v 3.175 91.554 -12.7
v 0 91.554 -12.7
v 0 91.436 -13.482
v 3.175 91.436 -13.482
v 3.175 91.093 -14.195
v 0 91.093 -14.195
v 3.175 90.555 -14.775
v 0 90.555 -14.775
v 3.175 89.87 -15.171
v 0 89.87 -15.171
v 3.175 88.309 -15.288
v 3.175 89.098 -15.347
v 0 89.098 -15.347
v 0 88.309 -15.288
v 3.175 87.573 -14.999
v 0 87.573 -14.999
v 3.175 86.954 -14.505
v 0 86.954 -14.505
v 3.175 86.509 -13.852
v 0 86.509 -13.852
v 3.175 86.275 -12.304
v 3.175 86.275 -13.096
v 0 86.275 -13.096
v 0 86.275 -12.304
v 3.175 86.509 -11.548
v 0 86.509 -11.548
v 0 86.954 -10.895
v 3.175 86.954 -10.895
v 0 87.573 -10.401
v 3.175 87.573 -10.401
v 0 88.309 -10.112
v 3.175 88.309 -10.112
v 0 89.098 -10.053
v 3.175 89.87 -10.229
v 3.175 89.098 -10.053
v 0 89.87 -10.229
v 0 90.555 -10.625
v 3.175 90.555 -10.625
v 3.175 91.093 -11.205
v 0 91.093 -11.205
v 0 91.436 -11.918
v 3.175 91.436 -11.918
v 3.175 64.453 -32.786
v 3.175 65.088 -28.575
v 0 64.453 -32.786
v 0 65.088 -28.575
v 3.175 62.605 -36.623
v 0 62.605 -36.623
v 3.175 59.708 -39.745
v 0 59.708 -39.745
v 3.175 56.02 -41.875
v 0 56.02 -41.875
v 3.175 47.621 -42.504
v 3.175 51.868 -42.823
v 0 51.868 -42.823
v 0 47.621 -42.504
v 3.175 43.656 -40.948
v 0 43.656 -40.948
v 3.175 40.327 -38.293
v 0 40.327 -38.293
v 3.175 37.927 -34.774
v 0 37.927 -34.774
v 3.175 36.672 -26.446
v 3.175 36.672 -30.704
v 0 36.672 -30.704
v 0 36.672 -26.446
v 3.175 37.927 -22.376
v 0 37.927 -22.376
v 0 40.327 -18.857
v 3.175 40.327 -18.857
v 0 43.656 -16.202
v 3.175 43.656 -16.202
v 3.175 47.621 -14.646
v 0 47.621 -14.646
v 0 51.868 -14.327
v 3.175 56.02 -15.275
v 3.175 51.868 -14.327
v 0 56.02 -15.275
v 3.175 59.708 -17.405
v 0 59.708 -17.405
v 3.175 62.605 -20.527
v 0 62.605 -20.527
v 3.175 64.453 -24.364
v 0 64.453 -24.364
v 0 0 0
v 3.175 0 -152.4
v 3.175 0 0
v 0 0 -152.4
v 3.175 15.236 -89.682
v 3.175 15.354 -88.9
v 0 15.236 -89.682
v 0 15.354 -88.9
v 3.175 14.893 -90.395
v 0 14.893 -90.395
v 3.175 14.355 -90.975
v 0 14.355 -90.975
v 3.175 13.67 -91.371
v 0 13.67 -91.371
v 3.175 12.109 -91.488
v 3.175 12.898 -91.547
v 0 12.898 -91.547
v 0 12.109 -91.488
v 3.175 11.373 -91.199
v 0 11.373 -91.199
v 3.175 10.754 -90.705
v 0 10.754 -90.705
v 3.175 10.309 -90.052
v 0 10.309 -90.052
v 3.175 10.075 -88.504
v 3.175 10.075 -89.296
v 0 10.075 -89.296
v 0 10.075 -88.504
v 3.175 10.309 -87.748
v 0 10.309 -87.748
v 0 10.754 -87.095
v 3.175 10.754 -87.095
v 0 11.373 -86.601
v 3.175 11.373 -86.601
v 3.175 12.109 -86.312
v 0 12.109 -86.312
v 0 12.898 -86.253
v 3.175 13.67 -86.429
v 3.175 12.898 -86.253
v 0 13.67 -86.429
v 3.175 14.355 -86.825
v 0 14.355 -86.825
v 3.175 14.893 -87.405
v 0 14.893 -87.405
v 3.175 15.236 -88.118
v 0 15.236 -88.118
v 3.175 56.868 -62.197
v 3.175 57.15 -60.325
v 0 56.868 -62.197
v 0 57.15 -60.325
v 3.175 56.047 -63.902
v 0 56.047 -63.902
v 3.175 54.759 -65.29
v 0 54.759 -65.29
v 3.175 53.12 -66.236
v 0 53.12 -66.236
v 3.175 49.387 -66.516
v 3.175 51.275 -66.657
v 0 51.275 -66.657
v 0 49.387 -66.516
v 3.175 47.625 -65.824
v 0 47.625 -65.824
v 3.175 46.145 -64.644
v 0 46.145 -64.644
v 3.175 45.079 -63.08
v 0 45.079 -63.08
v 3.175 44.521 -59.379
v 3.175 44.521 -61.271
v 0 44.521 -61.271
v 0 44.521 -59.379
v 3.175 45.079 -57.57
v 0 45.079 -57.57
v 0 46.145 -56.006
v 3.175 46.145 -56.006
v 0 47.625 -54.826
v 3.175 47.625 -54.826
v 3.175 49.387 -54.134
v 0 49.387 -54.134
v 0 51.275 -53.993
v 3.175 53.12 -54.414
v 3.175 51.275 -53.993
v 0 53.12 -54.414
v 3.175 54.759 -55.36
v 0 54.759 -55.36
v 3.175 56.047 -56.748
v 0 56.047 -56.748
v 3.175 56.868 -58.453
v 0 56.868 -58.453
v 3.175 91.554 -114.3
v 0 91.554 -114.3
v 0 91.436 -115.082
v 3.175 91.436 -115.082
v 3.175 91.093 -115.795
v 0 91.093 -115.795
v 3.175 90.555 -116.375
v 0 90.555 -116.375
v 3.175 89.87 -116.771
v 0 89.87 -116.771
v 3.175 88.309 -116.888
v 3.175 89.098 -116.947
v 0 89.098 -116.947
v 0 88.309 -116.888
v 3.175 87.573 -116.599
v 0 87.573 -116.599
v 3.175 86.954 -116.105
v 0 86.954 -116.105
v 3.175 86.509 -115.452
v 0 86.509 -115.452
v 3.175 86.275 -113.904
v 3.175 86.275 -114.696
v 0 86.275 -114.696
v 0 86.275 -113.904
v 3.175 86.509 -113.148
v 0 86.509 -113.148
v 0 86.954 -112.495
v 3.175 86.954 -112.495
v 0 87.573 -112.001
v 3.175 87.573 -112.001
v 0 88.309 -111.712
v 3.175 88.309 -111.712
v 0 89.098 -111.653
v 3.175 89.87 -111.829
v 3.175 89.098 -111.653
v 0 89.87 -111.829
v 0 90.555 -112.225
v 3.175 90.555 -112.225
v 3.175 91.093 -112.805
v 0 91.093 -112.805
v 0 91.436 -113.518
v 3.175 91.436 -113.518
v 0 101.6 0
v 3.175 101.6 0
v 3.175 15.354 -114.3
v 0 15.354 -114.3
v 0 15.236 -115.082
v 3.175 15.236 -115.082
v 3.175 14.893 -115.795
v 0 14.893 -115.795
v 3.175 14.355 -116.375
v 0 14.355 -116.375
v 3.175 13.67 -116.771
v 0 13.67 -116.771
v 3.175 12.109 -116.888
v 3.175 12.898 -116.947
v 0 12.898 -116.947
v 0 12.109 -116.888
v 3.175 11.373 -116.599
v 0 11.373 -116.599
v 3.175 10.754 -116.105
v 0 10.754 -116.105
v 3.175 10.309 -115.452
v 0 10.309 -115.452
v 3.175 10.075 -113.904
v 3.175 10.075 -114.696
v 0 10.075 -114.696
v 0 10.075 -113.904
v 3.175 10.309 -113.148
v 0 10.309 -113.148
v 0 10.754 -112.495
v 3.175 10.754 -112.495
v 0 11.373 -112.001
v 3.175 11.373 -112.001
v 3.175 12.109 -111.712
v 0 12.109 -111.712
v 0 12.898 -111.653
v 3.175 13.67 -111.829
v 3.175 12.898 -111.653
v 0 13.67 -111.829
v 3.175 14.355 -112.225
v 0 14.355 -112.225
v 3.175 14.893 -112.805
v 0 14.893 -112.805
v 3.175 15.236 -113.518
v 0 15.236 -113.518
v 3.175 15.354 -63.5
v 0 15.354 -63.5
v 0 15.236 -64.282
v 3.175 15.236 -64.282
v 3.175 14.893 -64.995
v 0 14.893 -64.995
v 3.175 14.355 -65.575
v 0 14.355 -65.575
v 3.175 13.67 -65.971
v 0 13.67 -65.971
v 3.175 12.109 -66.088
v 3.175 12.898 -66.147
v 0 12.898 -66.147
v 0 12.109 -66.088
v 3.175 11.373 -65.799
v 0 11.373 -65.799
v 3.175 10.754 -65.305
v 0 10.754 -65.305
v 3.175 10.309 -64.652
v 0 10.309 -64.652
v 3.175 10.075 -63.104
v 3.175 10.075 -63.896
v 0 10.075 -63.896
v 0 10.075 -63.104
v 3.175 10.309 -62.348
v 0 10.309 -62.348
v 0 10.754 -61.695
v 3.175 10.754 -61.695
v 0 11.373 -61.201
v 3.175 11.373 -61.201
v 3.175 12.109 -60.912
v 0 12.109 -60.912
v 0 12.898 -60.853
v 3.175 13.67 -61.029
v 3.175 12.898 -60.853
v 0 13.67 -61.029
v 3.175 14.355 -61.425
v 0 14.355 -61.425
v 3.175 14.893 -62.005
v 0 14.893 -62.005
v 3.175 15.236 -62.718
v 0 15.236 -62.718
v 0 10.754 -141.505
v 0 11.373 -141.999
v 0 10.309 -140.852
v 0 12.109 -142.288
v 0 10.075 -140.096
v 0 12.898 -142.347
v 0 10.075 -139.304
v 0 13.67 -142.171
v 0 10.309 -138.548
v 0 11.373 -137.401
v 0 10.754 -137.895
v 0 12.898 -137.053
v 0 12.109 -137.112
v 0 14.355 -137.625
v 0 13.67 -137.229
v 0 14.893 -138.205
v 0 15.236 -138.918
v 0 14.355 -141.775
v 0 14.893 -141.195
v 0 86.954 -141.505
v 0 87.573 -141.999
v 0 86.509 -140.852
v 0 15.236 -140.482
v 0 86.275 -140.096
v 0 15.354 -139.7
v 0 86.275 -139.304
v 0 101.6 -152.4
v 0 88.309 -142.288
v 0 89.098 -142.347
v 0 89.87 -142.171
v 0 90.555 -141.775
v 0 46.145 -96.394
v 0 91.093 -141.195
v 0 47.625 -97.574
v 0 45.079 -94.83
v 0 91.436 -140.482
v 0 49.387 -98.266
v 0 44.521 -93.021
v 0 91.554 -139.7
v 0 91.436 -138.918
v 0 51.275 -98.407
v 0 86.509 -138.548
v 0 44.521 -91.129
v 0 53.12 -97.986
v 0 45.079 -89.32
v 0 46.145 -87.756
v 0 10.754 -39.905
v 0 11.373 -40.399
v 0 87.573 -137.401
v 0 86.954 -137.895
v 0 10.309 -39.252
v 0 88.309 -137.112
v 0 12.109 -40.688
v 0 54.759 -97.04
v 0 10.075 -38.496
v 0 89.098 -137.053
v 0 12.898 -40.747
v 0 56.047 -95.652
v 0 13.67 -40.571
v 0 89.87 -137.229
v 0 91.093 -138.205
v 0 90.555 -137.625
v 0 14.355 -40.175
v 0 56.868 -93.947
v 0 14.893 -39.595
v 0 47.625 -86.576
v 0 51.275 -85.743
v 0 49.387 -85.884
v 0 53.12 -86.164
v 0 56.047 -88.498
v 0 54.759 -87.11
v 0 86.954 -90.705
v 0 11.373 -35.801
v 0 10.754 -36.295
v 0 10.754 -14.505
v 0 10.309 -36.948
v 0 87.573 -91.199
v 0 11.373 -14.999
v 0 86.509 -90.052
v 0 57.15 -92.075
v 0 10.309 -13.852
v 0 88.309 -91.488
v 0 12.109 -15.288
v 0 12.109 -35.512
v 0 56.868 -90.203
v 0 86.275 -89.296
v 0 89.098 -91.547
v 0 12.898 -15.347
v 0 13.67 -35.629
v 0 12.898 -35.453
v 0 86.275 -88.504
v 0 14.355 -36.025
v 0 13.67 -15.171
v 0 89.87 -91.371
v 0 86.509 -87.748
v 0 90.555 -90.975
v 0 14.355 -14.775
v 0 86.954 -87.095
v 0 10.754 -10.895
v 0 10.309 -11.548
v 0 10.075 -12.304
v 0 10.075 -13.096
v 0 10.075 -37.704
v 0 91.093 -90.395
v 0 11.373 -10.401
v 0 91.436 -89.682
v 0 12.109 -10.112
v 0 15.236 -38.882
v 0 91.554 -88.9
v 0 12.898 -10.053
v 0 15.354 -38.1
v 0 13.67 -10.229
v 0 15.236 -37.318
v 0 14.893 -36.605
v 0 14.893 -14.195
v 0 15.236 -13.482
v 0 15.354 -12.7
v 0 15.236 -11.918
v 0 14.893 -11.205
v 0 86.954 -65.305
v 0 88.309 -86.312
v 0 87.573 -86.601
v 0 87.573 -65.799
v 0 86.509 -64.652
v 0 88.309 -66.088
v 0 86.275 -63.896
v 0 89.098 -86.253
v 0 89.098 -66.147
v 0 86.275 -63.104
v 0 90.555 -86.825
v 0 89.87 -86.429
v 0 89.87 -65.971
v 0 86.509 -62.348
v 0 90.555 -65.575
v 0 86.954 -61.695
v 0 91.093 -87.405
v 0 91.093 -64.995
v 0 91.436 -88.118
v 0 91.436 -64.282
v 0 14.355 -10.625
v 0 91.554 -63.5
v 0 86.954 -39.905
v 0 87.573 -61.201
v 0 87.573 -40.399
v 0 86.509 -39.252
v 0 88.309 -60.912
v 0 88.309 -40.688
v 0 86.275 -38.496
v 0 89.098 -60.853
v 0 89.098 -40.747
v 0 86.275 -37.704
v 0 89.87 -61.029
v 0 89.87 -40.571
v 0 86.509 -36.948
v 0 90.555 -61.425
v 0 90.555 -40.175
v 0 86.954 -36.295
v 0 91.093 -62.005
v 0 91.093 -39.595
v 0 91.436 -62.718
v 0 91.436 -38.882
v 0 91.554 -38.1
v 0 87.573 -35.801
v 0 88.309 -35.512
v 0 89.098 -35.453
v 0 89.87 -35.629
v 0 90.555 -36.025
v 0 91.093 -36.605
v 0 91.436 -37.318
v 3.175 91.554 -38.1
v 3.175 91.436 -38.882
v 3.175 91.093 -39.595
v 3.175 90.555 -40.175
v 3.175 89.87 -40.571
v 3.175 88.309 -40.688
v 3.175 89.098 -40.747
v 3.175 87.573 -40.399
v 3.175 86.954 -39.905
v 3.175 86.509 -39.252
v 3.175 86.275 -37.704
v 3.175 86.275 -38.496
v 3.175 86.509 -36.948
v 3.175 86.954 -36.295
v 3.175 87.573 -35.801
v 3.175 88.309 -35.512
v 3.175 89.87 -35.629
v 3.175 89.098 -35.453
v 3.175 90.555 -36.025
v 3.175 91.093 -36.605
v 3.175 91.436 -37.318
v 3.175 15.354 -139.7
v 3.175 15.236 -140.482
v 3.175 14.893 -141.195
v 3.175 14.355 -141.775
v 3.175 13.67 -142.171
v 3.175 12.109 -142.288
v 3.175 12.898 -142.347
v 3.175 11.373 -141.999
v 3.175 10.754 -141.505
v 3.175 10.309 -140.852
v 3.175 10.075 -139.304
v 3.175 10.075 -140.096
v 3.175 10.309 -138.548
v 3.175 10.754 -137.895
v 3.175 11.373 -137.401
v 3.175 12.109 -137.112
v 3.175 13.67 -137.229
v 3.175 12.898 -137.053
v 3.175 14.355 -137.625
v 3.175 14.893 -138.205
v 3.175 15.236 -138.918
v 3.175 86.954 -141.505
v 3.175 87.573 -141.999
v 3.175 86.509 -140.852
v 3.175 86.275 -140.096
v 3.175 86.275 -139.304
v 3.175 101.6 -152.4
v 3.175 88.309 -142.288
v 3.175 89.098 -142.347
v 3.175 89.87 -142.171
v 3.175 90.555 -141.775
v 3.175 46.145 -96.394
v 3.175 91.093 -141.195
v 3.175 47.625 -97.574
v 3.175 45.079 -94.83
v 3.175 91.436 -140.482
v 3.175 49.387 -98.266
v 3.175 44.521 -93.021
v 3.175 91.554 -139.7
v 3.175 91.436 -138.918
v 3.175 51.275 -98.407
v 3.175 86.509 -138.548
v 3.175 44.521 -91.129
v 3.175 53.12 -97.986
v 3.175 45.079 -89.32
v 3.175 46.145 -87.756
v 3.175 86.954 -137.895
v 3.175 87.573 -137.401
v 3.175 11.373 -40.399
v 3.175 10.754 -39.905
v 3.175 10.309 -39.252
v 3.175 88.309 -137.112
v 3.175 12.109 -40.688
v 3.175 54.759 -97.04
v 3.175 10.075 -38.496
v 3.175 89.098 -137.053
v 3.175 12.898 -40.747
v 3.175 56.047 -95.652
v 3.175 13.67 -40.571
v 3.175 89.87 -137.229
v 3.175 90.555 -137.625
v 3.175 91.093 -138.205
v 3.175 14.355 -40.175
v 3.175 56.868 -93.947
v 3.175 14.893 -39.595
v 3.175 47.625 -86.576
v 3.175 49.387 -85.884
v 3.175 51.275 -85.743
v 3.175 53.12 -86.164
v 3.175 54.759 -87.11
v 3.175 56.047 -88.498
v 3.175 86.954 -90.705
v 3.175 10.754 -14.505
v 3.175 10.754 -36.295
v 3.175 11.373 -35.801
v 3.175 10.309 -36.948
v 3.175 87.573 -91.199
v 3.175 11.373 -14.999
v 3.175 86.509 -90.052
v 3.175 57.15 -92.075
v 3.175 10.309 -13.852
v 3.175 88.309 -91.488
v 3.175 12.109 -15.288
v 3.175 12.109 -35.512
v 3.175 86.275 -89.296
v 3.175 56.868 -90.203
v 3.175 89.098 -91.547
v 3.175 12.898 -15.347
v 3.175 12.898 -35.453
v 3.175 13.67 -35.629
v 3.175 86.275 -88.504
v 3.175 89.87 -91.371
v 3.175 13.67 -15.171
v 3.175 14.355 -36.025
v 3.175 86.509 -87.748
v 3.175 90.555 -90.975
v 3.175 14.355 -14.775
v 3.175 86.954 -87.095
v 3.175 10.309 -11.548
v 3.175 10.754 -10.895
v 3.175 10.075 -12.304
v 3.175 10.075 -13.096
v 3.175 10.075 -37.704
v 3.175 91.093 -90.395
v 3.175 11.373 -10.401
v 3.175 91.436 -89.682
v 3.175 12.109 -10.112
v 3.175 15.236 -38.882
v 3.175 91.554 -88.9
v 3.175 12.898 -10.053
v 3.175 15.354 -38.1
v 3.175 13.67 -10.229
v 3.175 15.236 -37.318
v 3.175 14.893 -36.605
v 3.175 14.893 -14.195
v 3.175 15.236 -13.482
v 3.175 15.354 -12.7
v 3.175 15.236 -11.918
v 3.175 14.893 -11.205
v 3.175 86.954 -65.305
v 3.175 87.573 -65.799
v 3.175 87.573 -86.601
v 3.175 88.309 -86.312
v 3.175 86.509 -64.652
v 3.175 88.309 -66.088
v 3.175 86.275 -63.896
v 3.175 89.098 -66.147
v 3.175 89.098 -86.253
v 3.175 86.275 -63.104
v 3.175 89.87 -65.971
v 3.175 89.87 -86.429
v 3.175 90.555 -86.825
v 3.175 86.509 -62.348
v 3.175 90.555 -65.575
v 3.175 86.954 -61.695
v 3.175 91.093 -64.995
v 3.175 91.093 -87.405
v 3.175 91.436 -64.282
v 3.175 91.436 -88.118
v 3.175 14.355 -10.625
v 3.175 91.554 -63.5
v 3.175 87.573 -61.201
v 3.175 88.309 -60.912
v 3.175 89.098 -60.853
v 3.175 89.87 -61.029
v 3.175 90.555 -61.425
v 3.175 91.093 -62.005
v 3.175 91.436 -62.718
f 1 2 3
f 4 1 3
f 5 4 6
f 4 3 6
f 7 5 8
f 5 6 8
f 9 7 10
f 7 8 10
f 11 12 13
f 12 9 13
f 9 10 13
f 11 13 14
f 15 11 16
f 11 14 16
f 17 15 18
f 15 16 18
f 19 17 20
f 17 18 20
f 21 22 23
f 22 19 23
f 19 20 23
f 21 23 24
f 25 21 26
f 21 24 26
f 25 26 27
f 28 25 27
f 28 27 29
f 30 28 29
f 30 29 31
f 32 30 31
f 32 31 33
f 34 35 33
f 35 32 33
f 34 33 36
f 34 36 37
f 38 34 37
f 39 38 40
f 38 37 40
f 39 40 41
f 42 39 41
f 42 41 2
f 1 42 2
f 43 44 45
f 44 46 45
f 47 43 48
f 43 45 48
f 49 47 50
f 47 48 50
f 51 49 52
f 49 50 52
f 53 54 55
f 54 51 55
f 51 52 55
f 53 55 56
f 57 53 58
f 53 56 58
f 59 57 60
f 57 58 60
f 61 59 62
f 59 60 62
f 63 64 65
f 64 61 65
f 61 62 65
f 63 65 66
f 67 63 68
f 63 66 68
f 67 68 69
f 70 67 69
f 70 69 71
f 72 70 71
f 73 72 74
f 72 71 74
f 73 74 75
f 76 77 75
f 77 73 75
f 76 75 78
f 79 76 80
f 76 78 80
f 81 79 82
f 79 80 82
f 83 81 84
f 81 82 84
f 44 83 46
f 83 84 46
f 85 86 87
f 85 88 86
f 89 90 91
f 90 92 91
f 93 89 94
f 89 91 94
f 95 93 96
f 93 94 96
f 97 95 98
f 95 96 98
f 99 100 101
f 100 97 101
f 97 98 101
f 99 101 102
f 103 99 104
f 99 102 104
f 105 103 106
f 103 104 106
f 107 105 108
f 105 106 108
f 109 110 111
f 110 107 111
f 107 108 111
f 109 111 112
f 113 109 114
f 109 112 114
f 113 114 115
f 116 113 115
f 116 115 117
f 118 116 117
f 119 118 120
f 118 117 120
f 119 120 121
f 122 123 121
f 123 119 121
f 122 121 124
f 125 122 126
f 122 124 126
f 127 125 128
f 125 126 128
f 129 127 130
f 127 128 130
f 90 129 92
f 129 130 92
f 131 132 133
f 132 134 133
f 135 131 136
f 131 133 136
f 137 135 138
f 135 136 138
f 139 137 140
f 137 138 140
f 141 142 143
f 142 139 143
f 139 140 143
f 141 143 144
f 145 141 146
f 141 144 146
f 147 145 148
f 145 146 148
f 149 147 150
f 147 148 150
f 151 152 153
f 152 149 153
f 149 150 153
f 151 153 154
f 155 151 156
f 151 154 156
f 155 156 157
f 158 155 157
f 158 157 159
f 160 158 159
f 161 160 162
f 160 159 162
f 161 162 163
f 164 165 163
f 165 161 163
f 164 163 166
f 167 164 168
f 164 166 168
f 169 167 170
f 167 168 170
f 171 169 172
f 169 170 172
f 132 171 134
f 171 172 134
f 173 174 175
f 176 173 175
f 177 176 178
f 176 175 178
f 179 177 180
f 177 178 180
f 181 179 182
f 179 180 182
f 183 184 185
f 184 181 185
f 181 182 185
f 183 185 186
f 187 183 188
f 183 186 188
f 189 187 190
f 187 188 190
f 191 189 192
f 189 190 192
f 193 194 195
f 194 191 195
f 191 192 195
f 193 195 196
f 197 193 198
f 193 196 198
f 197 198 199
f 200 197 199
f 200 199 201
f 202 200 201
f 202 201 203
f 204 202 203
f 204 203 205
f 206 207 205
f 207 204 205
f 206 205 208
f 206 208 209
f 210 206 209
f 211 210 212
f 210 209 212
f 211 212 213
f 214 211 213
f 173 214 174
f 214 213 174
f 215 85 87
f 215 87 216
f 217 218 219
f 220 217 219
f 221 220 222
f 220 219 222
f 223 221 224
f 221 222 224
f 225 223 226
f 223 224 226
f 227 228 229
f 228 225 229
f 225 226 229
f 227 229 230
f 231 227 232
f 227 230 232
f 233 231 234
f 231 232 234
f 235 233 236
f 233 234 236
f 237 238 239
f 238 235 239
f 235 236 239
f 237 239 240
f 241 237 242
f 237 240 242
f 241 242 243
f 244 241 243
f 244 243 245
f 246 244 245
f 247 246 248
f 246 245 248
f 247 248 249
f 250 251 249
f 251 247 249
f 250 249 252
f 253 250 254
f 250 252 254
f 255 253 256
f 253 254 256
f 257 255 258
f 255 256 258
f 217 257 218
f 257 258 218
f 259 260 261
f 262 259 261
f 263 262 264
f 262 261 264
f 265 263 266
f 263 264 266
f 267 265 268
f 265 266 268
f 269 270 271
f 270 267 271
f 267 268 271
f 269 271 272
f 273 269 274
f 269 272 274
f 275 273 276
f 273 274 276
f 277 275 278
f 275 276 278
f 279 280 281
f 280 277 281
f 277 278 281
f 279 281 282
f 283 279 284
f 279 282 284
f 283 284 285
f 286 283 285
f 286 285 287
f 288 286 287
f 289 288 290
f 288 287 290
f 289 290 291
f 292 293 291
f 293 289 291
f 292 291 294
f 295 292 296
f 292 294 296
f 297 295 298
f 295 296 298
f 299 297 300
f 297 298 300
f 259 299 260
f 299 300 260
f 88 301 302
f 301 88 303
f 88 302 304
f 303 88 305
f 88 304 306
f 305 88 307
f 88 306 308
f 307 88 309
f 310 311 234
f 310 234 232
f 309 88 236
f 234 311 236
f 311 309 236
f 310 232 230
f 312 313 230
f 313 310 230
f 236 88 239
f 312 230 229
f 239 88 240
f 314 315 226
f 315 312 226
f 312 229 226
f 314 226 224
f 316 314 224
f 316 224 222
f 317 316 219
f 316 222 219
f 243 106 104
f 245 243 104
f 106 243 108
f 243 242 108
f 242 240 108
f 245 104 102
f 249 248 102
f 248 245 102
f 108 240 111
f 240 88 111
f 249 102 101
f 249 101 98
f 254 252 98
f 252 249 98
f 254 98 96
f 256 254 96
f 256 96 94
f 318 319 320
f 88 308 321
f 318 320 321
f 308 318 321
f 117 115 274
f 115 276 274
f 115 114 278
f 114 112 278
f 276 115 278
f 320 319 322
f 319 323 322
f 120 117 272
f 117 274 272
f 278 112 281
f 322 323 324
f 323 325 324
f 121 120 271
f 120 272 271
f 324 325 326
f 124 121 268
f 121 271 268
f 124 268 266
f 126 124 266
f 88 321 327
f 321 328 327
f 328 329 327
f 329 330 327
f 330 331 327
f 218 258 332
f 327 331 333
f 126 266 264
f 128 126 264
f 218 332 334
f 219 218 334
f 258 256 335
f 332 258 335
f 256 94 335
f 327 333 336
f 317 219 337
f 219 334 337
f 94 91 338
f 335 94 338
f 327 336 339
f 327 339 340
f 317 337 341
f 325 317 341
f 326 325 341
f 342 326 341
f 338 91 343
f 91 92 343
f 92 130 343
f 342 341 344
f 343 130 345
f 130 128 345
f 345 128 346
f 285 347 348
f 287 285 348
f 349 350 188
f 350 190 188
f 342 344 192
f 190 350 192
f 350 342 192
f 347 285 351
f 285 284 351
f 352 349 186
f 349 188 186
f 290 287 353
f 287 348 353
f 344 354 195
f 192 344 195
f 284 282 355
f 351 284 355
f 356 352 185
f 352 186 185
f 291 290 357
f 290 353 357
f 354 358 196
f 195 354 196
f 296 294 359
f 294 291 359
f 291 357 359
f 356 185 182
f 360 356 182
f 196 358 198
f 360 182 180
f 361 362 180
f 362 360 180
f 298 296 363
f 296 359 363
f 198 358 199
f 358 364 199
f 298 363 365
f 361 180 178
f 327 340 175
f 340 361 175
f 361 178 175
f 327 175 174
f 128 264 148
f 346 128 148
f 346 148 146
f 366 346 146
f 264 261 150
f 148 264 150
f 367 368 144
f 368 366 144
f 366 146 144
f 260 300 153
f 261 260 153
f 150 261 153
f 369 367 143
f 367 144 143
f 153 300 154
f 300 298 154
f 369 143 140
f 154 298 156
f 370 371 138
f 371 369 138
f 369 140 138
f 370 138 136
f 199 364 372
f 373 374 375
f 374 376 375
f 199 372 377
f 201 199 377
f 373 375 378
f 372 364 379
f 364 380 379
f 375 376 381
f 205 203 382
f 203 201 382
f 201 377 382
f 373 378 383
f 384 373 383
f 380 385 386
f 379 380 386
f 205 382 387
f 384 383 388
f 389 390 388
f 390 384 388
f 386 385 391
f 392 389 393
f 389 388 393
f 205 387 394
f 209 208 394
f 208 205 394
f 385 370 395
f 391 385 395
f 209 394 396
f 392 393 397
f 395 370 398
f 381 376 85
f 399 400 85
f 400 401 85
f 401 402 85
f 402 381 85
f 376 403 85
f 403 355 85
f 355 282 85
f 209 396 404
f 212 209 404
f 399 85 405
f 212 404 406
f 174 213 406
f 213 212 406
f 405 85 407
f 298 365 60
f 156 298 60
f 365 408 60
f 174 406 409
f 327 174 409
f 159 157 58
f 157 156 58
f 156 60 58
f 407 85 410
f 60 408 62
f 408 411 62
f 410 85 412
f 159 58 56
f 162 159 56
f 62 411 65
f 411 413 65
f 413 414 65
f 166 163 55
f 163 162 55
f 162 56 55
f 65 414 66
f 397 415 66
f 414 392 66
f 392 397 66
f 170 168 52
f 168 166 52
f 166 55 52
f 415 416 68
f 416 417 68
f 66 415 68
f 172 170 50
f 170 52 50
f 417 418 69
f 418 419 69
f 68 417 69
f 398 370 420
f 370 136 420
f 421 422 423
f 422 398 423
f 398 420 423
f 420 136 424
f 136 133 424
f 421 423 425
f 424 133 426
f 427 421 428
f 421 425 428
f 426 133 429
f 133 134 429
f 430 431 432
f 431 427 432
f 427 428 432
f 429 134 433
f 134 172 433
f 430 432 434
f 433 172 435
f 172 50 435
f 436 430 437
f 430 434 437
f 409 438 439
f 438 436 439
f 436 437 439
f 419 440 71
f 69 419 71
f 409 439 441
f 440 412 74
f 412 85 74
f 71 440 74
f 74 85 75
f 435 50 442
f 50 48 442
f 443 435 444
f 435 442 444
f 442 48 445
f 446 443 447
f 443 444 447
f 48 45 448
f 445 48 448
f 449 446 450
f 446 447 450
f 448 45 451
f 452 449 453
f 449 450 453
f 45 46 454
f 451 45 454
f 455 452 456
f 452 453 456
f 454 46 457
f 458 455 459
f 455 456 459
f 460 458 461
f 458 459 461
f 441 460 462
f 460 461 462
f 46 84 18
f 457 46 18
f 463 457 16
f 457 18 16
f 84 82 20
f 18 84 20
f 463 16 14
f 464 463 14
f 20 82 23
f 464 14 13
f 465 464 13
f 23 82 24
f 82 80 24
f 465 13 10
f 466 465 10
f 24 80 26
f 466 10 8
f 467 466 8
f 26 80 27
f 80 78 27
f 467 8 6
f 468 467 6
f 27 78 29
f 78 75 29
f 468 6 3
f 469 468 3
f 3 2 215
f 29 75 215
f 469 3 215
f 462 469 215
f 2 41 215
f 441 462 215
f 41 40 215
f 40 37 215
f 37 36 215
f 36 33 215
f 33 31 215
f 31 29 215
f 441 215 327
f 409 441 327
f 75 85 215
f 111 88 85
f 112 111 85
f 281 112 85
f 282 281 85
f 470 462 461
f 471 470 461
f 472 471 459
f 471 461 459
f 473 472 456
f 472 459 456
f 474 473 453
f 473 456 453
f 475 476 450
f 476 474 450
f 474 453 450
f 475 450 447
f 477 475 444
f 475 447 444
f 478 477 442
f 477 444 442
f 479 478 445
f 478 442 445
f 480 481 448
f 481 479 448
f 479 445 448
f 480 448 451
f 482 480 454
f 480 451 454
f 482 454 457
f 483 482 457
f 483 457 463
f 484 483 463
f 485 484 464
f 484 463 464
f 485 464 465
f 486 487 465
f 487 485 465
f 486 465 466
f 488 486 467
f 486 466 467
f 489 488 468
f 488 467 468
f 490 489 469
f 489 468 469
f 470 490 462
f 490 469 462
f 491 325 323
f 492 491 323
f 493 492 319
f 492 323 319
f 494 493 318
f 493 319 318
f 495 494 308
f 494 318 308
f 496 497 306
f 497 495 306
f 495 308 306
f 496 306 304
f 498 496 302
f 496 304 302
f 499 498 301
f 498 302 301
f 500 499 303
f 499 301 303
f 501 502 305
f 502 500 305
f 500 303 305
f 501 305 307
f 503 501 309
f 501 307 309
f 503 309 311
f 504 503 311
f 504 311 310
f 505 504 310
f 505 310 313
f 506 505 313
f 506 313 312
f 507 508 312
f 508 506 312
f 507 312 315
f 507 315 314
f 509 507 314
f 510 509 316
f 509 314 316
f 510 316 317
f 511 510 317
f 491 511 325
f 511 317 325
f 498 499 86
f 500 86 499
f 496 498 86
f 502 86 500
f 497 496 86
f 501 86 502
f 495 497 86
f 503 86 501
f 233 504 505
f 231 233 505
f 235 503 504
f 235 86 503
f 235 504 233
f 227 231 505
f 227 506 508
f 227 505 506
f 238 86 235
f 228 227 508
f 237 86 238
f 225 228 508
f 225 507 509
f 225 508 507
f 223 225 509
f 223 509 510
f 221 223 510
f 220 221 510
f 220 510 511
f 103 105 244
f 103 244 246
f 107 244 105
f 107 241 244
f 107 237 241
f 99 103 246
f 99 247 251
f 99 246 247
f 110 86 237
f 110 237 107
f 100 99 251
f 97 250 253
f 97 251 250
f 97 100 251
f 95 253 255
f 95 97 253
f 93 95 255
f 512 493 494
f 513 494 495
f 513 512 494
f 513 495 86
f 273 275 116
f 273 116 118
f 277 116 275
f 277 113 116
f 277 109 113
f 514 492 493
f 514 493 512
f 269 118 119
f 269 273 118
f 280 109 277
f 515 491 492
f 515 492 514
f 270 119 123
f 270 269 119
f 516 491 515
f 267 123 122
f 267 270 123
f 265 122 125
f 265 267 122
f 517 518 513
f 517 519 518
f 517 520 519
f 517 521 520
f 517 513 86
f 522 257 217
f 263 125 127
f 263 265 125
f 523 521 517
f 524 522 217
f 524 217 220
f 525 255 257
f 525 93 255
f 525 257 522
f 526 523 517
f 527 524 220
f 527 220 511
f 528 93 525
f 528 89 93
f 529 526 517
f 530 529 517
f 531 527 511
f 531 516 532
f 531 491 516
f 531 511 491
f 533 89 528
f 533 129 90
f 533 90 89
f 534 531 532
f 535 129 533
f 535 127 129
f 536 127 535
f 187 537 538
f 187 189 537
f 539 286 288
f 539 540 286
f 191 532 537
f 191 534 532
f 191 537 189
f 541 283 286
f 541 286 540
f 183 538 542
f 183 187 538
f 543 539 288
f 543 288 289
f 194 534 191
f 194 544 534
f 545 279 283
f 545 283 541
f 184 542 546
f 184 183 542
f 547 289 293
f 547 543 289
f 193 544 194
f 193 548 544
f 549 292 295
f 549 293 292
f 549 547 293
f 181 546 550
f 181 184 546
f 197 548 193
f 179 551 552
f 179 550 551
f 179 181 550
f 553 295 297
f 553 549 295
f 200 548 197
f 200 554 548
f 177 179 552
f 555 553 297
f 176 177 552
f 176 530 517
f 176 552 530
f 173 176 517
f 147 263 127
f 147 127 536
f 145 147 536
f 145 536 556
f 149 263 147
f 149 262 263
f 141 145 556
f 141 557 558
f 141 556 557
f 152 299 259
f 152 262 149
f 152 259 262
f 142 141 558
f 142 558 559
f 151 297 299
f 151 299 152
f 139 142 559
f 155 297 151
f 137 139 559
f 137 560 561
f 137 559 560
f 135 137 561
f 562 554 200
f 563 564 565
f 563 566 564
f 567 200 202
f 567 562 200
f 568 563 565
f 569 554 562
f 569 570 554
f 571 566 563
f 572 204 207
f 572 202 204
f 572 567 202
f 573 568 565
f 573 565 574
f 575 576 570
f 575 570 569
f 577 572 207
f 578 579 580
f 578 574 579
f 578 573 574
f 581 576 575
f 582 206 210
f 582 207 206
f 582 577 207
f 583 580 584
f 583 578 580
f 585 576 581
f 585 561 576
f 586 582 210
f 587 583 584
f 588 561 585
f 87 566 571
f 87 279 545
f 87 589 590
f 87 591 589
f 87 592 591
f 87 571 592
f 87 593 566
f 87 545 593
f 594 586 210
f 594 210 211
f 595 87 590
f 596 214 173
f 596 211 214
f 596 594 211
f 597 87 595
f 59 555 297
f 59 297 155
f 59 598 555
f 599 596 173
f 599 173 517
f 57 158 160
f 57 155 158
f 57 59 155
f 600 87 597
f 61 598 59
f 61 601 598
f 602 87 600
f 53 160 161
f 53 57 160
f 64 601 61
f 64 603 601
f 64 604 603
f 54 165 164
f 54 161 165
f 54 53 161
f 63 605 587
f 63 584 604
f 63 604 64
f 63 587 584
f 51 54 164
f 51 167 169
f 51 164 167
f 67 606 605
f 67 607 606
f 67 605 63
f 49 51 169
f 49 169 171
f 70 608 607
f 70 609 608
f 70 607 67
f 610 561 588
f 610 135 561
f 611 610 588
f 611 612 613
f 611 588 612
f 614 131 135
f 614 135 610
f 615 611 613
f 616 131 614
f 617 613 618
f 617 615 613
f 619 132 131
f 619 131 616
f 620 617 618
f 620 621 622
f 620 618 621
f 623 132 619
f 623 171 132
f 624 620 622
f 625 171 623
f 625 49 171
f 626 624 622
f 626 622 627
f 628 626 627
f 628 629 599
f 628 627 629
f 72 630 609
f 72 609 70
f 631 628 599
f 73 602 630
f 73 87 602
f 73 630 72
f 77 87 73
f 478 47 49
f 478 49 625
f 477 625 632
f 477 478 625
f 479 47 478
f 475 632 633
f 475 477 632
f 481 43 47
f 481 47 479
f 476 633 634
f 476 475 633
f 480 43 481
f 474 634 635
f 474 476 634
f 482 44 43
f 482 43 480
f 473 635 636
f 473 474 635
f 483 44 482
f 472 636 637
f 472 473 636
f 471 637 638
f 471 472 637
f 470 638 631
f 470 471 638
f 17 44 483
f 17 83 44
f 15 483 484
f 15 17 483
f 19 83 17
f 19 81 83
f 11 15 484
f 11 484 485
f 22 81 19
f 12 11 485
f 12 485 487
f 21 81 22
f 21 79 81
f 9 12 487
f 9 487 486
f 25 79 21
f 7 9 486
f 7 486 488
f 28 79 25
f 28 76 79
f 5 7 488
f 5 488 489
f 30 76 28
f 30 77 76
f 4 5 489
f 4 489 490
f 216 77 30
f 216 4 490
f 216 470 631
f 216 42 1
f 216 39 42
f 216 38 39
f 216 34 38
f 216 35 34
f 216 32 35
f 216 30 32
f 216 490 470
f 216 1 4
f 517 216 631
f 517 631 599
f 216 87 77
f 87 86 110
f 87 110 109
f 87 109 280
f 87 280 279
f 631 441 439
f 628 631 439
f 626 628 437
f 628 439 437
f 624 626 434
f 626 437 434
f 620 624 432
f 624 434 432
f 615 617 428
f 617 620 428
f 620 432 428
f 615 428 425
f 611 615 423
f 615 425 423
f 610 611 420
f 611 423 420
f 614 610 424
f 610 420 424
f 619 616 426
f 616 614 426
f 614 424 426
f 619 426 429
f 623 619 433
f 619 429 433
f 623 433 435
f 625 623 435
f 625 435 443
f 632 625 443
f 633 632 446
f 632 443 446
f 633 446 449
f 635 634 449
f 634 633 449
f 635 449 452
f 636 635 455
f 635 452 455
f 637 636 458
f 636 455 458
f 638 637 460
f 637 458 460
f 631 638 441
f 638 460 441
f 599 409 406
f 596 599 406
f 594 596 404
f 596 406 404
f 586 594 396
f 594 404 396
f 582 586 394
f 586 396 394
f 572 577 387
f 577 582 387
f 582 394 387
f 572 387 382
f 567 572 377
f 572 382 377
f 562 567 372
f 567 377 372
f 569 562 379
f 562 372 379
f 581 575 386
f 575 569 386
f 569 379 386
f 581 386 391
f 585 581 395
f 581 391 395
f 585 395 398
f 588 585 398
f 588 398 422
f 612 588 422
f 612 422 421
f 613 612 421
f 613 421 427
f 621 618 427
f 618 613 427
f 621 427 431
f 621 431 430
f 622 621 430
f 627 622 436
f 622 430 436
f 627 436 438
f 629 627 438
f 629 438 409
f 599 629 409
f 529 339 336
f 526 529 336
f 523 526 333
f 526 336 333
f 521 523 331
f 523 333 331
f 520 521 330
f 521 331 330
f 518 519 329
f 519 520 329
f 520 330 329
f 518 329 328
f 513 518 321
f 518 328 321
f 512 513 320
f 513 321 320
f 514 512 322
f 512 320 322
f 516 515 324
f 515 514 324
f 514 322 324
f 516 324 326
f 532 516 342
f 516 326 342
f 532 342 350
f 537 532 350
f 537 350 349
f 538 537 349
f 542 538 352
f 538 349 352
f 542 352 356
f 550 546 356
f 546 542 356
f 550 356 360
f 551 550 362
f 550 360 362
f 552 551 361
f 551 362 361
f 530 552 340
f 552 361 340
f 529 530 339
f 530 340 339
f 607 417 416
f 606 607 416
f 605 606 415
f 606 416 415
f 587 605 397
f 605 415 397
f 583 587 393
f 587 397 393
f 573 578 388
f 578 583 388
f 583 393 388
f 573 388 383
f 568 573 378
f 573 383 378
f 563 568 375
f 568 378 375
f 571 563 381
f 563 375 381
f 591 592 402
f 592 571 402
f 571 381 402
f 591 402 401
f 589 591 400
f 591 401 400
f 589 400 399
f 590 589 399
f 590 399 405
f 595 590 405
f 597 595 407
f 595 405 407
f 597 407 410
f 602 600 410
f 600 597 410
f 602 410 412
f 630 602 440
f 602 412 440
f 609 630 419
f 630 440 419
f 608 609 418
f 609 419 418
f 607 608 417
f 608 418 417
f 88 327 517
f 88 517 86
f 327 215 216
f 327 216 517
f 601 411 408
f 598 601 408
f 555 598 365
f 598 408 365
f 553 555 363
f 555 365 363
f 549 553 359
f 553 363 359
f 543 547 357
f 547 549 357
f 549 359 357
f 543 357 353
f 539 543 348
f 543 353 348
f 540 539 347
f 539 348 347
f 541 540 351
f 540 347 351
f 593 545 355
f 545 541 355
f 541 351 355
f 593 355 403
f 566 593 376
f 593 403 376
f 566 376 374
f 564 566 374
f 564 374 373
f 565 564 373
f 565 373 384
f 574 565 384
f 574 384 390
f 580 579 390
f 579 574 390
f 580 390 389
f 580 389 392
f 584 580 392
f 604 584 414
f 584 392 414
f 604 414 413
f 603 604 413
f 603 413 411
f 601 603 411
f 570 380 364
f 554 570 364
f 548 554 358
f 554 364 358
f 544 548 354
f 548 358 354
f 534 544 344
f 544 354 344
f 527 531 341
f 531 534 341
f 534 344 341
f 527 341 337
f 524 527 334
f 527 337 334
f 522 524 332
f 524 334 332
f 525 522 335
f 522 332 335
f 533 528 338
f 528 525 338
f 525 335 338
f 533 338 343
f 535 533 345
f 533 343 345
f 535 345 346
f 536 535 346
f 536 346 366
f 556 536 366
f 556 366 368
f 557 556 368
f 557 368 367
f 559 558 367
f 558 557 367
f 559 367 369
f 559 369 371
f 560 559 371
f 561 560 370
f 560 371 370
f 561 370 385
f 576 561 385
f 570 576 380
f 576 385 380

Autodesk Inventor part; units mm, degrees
ref_plane "YZ Plane" through (0, 0, 0) normal (1, 0, 0) x (0, 1, 0)
ref_plane "XZ Plane" through (0, 0, 0) normal (0, 1, 0) x (-1, 0, 0)
ref_plane "XY Plane" through (0, 0, 0) normal (0, 0, 1) x (1, 0, 0)
sketch "Sketch1" plane through (0, 0, 0) normal (1, 0, 0) x (0, 1, 0)
  line L0 (0, 0) -> (101.6, 0)
  line L1 (101.6, 0) -> (101.6, -152.4)
  line L2 (101.6, -152.4) -> (0, -152.4)
  line L3 (0, -152.4) -> (0, 0)
  circle A0 centre (50.8, -28.575) radius 14.2875
  circle A1 centre (50.8, -60.325) radius 6.35
  circle A2 centre (50.8, -92.075) radius 6.35
  circle A3 centre (50.8, -123.825) radius 14.2875
  line L4 (50.8, -28.575) -> (50.8, -123.825) construction
  circle A4 centre (88.9, -12.7) radius 2.6543
  circle A5 centre (88.9, -38.1) radius 2.6543
  circle A6 centre (88.9, -63.5) radius 2.6543
  circle A7 centre (88.9, -88.9) radius 2.6543
  circle A8 centre (88.9, -114.3) radius 2.6543
  circle A9 centre (88.9, -139.7) radius 2.6543
  circle A10 centre (12.7, -12.7) radius 2.6543
  circle A11 centre (12.7, -38.1) radius 2.6543
  circle A12 centre (12.7, -63.5) radius 2.6543
  circle A13 centre (12.7, -88.9) radius 2.6543
  circle A14 centre (12.7, -114.3) radius 2.6543
  circle A15 centre (12.7, -139.7) radius 2.6543
  point P0 (101.6, -76.2)
  point P1 (50.8, -76.2)
  point P2 (50.8, -152.4)
  dimension "d0" = 101.6
  dimension "d1" = 152.4
  dimension "d2" = 28.575
  dimension "d3" = 12.7
  dimension "d4" = 12.7
  dimension "d5" = 28.575
  dimension "d6" = 31.75
  dimension "d7" = 31.75
  dimension "d8" = 31.75
  dimension "d9" = 5.3086
  dimension "d10" = 12.7
  dimension "d11" = 12.7
  dimension "d14" = 25.4
  dimension "d17" = 76.2
extrude "Extrusion1" add sketch "Sketch1" along normal blind 3.175 contours L0 L1 L2 L3 | A3
equation "\"d7\" = d6"
equation "\"d8\" = d7"
properties part number "CH-1-02-RearGearboxHousingWheelSide"
